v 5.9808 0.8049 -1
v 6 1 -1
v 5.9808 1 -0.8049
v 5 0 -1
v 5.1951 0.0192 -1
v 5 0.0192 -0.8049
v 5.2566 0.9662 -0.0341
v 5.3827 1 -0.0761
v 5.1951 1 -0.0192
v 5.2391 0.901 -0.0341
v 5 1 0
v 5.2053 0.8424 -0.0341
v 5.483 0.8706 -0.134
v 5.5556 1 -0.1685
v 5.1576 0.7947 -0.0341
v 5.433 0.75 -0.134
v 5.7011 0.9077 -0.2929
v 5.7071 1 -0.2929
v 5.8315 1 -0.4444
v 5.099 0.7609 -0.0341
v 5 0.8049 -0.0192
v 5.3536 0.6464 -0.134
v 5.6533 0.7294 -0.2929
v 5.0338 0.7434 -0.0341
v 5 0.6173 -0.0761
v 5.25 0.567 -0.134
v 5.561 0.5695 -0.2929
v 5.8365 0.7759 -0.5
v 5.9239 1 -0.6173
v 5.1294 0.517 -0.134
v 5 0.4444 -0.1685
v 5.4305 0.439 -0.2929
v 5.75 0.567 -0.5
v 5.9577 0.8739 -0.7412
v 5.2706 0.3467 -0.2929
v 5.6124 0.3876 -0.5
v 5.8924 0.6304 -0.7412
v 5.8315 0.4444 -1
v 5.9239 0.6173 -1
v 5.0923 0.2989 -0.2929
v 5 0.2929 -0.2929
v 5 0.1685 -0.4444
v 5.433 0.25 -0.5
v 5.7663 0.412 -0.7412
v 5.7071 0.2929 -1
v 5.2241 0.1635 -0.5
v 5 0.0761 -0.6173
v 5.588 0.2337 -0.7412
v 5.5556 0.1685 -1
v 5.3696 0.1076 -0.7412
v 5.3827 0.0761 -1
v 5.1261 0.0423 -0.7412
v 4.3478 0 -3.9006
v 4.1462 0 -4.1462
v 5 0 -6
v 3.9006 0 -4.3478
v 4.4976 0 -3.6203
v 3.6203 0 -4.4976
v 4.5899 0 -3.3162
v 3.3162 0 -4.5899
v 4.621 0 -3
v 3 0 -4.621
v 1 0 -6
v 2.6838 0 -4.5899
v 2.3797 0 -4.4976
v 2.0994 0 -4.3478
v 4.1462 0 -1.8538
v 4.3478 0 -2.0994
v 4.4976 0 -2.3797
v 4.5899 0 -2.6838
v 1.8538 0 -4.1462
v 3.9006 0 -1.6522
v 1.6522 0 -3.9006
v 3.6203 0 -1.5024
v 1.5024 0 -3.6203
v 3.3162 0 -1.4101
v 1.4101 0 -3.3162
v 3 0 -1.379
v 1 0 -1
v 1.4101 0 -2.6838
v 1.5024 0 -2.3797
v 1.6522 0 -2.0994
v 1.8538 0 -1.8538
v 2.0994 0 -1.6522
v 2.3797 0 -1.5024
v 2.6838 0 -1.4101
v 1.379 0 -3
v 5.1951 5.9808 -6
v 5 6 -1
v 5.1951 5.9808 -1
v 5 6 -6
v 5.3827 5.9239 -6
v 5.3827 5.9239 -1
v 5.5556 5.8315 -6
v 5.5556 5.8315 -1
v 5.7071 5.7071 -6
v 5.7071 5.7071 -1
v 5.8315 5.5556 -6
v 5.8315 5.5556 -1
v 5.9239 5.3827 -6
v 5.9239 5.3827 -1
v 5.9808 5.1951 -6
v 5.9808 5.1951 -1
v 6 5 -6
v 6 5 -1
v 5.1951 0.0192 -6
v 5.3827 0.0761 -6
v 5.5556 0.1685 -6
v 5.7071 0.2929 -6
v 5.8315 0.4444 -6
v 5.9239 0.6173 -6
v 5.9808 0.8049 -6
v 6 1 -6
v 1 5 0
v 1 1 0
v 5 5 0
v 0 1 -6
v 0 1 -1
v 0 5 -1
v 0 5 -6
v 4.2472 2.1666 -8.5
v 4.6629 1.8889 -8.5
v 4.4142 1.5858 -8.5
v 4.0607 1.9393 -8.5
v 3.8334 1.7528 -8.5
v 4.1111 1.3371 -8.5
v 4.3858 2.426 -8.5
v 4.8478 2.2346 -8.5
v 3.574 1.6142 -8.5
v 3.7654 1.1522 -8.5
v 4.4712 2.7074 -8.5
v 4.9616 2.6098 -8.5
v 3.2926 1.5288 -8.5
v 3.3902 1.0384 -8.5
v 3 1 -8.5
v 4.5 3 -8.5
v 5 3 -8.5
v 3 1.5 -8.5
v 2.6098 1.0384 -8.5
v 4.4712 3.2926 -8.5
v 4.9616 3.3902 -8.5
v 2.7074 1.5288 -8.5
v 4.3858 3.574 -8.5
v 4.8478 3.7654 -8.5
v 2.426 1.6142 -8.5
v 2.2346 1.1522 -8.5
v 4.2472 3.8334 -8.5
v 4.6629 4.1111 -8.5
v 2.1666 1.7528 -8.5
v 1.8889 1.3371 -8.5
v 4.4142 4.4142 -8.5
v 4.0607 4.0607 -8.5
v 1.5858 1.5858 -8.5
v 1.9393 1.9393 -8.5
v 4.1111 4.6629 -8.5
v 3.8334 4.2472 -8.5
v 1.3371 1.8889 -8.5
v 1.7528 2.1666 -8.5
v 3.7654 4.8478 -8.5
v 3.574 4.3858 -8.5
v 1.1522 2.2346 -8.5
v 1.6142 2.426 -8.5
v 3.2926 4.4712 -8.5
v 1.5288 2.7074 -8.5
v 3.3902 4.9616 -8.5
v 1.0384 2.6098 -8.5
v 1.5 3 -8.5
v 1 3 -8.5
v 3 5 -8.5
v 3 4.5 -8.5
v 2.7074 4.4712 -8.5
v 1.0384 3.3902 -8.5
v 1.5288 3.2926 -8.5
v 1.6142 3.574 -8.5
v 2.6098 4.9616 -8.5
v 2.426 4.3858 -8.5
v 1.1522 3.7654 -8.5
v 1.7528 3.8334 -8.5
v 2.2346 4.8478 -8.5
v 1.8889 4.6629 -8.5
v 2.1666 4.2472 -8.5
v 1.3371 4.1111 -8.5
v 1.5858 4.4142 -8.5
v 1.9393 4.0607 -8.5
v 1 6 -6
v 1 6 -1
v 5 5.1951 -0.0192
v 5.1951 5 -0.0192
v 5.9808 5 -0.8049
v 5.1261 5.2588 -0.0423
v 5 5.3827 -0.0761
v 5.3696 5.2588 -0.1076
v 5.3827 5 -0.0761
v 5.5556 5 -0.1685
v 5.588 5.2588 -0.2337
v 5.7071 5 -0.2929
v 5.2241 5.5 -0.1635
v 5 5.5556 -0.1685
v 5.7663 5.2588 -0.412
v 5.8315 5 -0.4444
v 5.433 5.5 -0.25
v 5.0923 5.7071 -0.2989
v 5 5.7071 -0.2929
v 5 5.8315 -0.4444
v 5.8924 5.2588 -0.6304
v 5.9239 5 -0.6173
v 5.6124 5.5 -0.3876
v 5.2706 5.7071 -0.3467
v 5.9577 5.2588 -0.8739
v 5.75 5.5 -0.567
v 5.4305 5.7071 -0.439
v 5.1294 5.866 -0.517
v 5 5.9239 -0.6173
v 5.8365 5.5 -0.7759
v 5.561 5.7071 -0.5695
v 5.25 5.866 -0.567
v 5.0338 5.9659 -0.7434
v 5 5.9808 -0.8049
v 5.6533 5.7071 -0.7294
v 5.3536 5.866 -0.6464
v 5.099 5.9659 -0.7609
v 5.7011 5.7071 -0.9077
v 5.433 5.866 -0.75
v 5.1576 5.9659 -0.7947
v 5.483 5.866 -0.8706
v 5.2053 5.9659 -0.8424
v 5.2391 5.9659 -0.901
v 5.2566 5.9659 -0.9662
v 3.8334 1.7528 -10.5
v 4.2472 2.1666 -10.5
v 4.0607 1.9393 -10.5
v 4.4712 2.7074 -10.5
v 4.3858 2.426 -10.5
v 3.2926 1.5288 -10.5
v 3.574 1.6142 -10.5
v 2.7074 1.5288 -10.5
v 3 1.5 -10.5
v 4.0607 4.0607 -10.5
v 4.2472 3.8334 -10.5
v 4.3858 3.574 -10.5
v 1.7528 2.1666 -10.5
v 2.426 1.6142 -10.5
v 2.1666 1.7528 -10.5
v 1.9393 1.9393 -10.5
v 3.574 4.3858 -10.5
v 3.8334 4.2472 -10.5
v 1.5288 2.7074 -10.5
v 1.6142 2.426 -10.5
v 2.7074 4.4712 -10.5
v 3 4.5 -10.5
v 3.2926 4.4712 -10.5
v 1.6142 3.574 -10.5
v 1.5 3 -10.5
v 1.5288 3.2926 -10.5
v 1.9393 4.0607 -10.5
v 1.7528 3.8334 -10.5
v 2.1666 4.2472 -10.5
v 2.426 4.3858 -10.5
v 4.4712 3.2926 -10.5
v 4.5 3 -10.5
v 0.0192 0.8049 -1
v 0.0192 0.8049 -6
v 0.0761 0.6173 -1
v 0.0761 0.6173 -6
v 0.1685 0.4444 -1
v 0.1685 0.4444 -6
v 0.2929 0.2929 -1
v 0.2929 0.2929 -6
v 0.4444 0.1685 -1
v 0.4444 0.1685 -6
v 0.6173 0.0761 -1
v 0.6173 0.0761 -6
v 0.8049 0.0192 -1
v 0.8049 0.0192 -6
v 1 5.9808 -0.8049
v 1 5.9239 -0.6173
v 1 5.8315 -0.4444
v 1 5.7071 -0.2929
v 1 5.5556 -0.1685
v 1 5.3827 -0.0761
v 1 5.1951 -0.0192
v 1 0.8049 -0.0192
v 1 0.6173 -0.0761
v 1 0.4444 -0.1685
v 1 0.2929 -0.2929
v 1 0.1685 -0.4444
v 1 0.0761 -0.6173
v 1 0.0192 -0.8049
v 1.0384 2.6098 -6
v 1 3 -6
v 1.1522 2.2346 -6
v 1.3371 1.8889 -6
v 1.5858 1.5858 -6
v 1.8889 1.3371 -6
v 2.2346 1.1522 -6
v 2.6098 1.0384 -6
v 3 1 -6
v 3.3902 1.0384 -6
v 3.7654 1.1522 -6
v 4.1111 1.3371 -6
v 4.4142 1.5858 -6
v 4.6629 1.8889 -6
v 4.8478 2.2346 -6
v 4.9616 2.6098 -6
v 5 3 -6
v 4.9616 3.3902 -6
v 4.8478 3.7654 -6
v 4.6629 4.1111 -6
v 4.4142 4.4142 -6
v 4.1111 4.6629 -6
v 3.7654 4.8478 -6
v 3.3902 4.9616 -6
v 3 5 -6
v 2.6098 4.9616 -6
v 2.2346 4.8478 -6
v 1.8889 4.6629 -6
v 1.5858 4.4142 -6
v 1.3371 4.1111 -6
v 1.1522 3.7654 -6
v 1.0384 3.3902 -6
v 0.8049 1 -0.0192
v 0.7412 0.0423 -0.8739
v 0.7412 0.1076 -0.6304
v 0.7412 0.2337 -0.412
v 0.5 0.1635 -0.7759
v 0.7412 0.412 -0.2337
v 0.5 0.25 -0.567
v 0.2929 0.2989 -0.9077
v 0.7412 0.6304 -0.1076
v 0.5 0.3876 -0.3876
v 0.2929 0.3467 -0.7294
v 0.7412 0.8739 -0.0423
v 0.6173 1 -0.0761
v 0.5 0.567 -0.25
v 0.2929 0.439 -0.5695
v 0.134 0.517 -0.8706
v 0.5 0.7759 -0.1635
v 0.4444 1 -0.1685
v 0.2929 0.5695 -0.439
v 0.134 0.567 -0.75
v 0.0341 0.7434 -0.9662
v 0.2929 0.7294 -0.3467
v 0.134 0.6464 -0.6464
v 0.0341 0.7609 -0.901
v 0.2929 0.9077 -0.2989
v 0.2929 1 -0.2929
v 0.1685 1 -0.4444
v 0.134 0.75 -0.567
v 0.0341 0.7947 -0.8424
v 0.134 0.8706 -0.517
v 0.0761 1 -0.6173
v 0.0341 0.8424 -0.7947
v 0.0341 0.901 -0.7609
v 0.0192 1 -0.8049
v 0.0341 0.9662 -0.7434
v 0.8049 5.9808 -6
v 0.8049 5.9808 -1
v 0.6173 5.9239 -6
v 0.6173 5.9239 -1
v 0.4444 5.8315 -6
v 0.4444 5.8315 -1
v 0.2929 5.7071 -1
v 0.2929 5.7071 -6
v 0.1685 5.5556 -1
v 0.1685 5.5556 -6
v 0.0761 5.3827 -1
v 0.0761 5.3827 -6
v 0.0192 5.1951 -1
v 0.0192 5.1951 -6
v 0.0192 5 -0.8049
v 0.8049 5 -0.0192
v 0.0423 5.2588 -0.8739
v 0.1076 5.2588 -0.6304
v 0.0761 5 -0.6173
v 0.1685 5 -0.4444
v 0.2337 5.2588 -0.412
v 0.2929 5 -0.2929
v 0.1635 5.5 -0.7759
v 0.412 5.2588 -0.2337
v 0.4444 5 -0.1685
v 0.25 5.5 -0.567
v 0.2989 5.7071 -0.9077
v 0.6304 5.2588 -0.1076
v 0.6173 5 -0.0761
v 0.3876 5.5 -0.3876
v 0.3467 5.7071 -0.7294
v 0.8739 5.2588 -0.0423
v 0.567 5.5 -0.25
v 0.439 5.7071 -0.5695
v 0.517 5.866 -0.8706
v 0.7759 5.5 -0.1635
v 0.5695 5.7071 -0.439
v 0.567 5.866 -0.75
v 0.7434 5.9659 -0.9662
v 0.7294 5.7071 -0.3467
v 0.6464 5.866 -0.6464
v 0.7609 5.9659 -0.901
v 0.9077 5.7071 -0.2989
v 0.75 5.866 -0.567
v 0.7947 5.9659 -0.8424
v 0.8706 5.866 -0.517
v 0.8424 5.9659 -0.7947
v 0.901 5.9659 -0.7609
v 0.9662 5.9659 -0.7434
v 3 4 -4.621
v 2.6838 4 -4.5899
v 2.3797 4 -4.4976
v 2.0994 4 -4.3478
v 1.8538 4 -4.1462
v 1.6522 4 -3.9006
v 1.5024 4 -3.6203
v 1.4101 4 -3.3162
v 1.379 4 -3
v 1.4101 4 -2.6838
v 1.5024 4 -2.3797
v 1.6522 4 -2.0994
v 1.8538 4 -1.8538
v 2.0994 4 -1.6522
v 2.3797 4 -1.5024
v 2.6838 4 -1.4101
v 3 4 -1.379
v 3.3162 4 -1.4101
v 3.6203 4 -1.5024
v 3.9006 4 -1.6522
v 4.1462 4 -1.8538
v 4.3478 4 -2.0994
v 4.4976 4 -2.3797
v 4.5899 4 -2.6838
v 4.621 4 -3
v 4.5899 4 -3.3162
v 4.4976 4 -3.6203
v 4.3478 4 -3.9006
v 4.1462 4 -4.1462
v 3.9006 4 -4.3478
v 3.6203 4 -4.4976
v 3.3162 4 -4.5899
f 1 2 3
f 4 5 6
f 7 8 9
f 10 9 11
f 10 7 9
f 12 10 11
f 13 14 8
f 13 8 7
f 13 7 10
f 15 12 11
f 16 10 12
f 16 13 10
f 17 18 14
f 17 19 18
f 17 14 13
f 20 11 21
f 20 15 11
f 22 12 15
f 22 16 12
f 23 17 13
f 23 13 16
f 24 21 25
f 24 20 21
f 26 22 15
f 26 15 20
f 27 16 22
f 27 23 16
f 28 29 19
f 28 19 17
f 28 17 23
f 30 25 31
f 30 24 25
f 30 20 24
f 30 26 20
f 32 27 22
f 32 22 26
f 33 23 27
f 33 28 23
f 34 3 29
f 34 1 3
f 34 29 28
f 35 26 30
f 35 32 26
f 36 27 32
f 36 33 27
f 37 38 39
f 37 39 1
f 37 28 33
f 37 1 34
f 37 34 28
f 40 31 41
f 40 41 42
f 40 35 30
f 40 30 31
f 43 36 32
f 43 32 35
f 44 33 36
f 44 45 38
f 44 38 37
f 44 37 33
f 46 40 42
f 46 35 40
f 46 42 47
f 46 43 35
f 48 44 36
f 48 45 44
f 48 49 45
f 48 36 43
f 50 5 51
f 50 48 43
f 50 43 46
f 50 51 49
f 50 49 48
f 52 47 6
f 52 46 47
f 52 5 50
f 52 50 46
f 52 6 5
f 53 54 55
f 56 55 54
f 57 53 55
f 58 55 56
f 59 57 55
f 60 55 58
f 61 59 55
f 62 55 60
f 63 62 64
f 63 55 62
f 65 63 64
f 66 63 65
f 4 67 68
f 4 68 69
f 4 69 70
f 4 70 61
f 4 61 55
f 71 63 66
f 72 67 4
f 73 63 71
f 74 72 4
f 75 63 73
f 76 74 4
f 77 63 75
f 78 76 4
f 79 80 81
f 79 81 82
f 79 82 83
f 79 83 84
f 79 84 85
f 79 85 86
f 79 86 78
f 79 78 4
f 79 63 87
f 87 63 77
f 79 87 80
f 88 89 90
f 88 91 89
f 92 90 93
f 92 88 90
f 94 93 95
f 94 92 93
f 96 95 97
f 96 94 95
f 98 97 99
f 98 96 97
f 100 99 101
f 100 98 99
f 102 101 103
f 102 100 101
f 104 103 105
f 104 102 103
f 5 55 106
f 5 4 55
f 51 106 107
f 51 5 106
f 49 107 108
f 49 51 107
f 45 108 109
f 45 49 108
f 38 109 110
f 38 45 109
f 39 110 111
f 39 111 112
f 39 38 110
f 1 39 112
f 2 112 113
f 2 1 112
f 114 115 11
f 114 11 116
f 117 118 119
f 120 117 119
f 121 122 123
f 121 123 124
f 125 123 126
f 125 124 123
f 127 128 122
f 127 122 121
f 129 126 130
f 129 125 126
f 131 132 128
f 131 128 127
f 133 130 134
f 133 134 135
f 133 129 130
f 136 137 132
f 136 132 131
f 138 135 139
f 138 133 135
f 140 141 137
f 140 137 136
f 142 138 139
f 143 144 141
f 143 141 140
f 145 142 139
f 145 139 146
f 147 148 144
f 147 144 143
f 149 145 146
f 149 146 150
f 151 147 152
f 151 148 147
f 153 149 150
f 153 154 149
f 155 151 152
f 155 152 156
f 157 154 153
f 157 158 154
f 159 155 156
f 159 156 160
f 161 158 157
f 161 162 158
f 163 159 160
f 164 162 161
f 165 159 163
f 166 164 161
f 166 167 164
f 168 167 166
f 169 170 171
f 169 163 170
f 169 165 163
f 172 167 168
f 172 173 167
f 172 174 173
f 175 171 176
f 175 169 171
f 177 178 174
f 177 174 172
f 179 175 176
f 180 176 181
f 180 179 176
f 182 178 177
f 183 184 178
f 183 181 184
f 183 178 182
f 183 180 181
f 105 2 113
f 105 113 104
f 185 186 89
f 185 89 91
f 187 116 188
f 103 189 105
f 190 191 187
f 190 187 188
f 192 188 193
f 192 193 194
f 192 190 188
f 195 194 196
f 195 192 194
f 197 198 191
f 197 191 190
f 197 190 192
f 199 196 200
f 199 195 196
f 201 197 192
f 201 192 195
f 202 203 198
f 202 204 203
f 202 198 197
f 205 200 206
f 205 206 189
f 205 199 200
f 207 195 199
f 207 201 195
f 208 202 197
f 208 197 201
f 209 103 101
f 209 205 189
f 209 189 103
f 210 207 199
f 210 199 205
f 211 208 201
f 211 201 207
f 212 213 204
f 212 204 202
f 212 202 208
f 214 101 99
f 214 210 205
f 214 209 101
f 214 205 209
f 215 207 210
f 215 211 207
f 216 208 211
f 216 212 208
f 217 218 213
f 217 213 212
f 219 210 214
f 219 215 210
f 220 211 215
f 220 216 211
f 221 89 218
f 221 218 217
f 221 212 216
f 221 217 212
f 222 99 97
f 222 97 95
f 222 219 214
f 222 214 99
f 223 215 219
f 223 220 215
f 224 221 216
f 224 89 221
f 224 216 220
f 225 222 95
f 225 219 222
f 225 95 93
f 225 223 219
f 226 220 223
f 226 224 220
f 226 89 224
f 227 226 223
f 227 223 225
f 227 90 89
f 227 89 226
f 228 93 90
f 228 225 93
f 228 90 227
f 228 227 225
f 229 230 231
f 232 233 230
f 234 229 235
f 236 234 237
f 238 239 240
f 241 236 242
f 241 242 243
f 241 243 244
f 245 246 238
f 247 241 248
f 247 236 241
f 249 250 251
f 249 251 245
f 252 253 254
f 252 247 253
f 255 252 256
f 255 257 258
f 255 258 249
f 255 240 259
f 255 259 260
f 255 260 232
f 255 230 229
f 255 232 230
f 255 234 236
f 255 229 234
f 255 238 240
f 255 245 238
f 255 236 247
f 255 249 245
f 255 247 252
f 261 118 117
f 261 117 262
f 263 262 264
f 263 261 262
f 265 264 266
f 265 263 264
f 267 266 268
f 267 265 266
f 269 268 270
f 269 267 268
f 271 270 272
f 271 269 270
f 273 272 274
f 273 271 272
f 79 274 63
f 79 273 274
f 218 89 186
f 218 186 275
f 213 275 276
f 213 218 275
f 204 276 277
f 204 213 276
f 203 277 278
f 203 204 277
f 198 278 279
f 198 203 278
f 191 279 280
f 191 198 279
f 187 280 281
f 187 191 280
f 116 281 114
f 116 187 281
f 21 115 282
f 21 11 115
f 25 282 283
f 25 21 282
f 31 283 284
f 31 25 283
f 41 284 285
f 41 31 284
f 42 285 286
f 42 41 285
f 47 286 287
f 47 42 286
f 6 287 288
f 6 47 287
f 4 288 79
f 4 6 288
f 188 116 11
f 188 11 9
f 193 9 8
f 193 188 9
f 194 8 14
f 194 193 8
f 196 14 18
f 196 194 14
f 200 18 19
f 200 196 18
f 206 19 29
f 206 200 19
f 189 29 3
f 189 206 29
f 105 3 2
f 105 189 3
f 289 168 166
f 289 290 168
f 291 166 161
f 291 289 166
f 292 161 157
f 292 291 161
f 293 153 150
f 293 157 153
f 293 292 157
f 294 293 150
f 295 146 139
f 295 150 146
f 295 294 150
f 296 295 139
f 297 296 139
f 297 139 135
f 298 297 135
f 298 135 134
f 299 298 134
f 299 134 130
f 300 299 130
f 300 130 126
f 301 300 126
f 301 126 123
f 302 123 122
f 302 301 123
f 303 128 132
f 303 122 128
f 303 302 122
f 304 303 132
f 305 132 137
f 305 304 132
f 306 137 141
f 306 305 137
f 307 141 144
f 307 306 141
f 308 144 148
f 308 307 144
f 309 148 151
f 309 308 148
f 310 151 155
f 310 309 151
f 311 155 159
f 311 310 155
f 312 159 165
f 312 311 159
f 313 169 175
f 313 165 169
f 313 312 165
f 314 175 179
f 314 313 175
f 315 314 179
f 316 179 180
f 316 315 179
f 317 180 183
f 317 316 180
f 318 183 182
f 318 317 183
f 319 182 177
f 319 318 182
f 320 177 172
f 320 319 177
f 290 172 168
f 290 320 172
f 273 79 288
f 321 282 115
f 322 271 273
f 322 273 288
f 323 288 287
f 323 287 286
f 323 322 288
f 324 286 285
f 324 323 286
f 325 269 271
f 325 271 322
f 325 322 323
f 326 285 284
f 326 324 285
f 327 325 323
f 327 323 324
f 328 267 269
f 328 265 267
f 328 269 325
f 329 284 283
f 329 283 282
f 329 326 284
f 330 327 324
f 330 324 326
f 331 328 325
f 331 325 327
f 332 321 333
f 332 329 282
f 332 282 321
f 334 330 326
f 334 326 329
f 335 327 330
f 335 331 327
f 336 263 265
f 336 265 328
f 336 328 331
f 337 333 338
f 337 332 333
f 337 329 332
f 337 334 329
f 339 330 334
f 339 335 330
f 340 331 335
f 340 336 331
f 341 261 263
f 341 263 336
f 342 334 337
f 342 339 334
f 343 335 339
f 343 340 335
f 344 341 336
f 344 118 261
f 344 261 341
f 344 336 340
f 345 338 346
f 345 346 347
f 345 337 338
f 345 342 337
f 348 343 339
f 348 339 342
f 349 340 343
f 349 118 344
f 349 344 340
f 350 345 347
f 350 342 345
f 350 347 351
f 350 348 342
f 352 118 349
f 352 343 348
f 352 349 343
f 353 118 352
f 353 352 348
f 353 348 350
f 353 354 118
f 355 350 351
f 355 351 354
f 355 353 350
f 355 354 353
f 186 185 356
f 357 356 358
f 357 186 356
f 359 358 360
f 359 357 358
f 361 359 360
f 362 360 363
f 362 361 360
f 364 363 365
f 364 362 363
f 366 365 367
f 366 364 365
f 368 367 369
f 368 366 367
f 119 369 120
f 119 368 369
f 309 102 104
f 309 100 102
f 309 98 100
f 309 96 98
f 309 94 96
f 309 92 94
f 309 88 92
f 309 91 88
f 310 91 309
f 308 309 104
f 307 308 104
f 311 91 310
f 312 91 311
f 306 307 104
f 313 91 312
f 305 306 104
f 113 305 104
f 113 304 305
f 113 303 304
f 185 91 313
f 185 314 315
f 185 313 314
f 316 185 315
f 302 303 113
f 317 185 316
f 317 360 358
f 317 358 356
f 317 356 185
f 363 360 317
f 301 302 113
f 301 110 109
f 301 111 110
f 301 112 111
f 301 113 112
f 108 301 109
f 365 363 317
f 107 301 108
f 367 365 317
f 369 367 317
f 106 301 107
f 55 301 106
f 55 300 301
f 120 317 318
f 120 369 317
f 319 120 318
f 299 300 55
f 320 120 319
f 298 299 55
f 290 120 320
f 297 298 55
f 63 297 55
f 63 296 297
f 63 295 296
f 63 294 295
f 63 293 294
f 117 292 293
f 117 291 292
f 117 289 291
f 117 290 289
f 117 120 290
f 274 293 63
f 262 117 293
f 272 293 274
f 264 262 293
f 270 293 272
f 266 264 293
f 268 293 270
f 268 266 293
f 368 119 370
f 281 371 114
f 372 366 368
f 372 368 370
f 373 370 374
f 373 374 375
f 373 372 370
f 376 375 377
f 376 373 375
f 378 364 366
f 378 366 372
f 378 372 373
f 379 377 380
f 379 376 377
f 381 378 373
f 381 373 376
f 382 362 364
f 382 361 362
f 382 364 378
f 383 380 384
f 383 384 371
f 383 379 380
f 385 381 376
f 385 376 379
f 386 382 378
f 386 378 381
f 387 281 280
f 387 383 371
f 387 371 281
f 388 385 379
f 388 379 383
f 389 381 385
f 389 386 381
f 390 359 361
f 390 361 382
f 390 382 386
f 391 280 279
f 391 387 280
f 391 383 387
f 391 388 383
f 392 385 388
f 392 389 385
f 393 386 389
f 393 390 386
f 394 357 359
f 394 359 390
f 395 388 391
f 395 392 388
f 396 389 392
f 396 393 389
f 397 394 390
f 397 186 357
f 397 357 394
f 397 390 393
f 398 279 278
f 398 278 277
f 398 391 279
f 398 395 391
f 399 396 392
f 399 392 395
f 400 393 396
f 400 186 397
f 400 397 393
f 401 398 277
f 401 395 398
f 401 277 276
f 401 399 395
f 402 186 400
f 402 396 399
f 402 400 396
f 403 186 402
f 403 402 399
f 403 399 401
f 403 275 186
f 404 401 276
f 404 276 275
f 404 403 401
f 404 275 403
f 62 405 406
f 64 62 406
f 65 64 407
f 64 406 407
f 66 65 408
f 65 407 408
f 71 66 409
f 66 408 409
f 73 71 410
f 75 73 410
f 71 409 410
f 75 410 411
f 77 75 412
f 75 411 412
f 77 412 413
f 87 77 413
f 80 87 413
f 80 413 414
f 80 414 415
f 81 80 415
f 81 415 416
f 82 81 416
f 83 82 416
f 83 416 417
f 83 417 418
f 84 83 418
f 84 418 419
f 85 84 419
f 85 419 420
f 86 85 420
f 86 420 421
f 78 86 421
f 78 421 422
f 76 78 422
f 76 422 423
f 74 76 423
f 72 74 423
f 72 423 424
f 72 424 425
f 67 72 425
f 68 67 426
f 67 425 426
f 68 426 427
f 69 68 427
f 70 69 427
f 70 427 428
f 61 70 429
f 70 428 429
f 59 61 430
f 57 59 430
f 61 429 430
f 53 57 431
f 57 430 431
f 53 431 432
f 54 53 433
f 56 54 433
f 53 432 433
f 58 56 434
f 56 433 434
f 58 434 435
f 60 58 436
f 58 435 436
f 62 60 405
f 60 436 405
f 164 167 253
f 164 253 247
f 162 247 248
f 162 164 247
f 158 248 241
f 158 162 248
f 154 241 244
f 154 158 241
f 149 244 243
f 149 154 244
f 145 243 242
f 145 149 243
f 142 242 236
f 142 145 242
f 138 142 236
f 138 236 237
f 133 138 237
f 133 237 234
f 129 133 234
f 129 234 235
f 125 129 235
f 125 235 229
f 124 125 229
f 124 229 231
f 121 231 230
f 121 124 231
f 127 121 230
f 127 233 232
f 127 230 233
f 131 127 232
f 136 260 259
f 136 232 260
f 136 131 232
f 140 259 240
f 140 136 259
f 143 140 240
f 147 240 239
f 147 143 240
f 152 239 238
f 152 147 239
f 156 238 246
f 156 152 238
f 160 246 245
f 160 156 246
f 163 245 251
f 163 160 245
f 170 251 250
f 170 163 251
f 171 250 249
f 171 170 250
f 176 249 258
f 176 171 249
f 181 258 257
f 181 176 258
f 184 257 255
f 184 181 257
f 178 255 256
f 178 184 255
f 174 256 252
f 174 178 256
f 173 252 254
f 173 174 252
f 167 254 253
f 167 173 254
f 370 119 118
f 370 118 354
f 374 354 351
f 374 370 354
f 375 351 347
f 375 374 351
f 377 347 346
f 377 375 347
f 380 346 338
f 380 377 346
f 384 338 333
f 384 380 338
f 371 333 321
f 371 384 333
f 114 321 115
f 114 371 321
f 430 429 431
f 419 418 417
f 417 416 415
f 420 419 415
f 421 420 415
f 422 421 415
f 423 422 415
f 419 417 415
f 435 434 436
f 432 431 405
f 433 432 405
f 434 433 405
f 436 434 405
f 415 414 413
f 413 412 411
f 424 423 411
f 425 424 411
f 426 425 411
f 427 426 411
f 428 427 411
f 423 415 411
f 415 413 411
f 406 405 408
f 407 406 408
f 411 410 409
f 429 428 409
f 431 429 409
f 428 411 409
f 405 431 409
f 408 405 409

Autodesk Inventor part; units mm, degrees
ref_plane "YZ Plane" through (0, 0, 0) normal (1, 0, 0) x (0, 1, 0)
ref_plane "XZ Plane" through (0, 0, 0) normal (0, 1, 0) x (-1, 0, 0)
ref_plane "XY Plane" through (0, 0, 0) normal (0, 0, 1) x (1, 0, 0)
sketch "Esboço1" plane through (0, 0, 0) normal (1, 0, 0) x (0, 1, 0)
  line L0 (0, 0) -> (6, 0)
  line L1 (6, 0) -> (6, -6)
  line L2 (6, -6) -> (0, -6)
  line L3 (0, -6) -> (0, 0)
  dimension "d0" = 6
  dimension "d1" = 6
extrude "Extrusão1" add sketch "Esboço1" along normal blind 6
sketch "Esboço2" plane through (0, 0, -6) normal (0, -1, 0) x (1, 0, 0)
  line L0 (0, 6) -> (6, 6) projected
  line L1 (0, 0) -> (6, 0) projected
  point P0 (3, 3)
hole "Furo1" at (3, 0, -3) direction (0, 1, 0) diameter 3.242 depth 4 thread size "M4x0.7" class "6H" standard "ANSI Metric M Profile"
sketch "Esboço3" plane through (0, 0, -6) normal (0, 0, -1) x (-1, 0, 0)
  line L0 (0, 0) -> (-6, 0) projected
  line L1 (0, 6) -> (-6, 6) projected
  circle A0 centre (-3, 3) radius 2
  dimension "d11" = 4
extrude "Extrusão2" add sketch "Esboço3" along normal blind 2.5
sketch "Esboço4" plane through (3, 3, -8.5) normal (0, 0, -1) x (-1, 0, 0)
  point P0 (3, -3)
  point P1 (0, 0)
sketch "Esboço7" plane through (3, 3, -8.5) normal (0, 0, -1) x (-1, 0, 0)
  circle A0 centre (0, 0) radius 1.5
  point P0 (3, -3)
  dimension "d20" = 3
extrude "Extrusão4" add sketch "Esboço7" along normal blind 2
thread "Rosca2" size "M3x0.5" class "6g" standard "ANSI Metric M Profile" full length
fillet "Arredondamento1" radius 1 1 edges at (6, 0, -3)
fillet "Arredondamento2" radius 1 3 edges at (6, 3.5, 0) (5.7071, 0.2929, 0) (2.5, 0, 0)
fillet "Arredondamento3" radius 1 3 edges at (0, 3.5, 0) (0, 0.2929, -0.2929) (0, 0, -3.5)
fillet "Arredondamento4" radius 1 5 edges at (3, 6, 0) (5.7071, 6, -0.2929) (6, 6, -3.5) (0.2929, 6, -0.2929) (0, 6, -3.5)
properties part number "CONECTOR L-F"
